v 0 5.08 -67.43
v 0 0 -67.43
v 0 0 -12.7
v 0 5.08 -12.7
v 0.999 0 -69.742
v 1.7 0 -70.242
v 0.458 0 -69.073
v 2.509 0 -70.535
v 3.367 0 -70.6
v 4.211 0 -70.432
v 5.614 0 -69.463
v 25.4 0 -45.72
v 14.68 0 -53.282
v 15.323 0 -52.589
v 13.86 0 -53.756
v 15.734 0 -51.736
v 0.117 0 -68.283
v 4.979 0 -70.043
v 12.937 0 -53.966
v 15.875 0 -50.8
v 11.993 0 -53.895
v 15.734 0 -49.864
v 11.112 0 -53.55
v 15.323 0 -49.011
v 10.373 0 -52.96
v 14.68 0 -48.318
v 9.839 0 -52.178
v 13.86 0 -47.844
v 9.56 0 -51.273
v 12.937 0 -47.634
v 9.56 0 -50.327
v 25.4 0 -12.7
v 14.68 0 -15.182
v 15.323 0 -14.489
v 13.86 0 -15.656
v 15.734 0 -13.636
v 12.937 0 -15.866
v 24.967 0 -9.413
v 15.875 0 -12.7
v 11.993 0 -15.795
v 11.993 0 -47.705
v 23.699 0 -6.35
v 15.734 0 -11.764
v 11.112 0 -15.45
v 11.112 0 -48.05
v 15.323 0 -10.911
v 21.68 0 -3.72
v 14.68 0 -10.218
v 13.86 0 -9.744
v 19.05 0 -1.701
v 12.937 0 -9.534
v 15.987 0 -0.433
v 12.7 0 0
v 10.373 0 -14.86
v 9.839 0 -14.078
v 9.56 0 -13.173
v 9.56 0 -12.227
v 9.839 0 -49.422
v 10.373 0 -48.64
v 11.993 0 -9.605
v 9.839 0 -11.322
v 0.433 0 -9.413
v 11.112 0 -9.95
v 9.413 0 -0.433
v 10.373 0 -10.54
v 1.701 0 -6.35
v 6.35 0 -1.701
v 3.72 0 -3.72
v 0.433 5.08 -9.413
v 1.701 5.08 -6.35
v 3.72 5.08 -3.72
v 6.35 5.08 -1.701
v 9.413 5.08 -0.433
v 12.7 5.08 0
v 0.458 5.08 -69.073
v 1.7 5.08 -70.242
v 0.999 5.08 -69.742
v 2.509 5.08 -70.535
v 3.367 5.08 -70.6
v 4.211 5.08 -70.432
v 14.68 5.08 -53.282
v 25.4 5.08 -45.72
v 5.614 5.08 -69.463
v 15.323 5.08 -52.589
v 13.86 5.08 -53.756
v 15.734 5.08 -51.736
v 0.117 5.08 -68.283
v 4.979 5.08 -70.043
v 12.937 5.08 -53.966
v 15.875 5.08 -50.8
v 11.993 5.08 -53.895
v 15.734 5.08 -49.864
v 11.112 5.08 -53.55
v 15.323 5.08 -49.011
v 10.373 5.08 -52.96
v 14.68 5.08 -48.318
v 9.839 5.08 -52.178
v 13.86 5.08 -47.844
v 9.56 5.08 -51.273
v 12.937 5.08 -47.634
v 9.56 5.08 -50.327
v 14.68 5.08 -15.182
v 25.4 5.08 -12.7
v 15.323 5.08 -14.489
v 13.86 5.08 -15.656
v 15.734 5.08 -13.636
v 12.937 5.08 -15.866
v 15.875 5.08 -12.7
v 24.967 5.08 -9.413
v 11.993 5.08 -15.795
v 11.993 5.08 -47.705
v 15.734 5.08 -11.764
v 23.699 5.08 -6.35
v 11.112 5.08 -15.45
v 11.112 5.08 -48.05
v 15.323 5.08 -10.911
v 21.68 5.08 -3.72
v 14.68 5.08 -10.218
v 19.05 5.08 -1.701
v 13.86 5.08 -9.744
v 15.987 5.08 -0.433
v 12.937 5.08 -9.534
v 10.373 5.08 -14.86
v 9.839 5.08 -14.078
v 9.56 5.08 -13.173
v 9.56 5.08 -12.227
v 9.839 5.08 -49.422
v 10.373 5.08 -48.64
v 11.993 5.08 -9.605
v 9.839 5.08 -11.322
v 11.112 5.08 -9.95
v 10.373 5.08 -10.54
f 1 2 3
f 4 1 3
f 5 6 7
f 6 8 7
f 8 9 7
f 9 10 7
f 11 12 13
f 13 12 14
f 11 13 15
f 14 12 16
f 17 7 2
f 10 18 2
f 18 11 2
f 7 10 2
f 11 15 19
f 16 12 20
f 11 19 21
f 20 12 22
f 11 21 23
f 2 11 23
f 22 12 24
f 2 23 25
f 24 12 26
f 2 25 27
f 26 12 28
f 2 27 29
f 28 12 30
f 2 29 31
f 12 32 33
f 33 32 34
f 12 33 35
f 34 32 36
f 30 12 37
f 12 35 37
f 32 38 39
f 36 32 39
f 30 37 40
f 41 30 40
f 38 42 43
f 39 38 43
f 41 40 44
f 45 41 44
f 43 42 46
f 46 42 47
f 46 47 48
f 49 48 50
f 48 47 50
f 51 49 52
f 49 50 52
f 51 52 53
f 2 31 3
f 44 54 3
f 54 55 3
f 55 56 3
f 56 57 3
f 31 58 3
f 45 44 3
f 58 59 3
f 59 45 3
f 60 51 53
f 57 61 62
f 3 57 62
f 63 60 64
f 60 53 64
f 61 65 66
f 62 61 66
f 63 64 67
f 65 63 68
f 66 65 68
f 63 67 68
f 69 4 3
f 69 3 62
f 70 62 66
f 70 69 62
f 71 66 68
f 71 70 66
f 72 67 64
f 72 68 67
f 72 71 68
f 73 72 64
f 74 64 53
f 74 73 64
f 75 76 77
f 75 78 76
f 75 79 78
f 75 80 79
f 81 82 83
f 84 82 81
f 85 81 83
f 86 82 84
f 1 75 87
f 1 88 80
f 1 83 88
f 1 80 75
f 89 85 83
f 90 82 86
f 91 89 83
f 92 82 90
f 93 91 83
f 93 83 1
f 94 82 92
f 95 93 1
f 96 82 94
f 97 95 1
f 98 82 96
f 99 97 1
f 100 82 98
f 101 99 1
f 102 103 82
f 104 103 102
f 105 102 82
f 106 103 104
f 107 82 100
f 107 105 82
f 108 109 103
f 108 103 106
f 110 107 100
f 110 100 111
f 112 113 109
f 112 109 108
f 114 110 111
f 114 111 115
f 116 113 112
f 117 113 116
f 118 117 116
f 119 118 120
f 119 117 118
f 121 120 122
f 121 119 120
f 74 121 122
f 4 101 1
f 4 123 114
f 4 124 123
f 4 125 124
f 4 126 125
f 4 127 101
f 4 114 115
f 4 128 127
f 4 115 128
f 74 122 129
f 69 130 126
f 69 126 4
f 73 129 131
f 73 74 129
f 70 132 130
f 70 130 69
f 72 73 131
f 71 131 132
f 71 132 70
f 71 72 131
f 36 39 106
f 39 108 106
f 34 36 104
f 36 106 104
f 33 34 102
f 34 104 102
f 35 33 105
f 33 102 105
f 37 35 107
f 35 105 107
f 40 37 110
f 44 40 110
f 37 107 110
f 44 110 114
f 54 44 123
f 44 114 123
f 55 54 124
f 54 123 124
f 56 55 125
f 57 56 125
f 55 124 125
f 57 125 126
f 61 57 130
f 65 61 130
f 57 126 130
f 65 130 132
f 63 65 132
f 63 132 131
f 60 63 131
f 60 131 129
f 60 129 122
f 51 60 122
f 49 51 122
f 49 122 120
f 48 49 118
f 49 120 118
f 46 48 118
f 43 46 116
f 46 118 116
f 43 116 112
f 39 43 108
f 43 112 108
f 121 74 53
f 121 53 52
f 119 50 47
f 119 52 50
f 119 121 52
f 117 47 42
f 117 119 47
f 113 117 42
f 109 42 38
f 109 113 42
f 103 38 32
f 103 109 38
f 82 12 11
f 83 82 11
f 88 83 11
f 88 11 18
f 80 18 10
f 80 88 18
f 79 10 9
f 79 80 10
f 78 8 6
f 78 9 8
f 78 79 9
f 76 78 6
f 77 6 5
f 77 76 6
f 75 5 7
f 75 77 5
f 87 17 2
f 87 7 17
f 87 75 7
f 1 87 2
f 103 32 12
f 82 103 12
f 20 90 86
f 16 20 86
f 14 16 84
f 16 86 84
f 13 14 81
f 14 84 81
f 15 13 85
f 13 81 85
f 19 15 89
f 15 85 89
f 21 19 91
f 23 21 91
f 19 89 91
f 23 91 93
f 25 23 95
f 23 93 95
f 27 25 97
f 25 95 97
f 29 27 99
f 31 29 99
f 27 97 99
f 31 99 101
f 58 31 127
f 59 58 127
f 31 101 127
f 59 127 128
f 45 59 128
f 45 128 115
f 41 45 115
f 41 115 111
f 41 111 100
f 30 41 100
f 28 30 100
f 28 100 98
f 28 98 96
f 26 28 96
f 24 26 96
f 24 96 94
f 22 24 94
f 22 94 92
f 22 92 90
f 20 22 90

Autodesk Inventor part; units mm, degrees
ref_plane "YZ Plane" through (0, 0, 0) normal (1, 0, 0) x (0, 1, 0)
ref_plane "XZ Plane" through (0, 0, 0) normal (0, 1, 0) x (-1, 0, 0)
ref_plane "XY Plane" through (0, 0, 0) normal (0, 0, 1) x (1, 0, 0)
sketch "Sketch1" plane through (0, 0, 0) normal (0, 1, 0) x (-1, 0, 0)
  line L0 (0, 0) -> (-25.4, 0)
  line L1 (-25.4, 0) -> (-25.4, -45.72)
  line L2 (0, -76.2) -> (0, 0)
  line L3 (-25.4, 0) -> (-25.4, -45.72)
  line L4 (-25.4, -45.72) -> (0, -76.2)
  point P0 (0, -76.2)
  dimension "d2" = 45.72
  dimension "d22" = 25.4
  dimension "d23" = 76.2
extrude "Extrusion1" add sketch "Sketch1" along normal blind 5.08
fillet "Fillet2" radius 12.7 1 edges at (25.4, 2.54, 0)
fillet "Fillet3" radius 12.7 1 edges at (0, 2.54, 0)
sketch "Sketch2" plane through (0, 5.08, 0) normal (0, 1, 0) x (1, 0, 0)
  circle A0 centre (12.7, 12.7) radius 3.175
  circle A1 centre (12.7, 50.8) radius 3.175
  point P0 (0, 0)
  dimension "d9" = 6.35
  dimension "d10" = 12.7
  dimension "d11" = 12.7
  dimension "d16" = 6.35
  dimension "d17" = 38.1
  dimension "d18" = 12.7
extrude "Extrusion2" cut sketch "Sketch2" against normal blind 12.7
fillet "Fillet6" radius 3.175 1 edges at (0, 2.54, -76.2)
properties part number "Finger"
